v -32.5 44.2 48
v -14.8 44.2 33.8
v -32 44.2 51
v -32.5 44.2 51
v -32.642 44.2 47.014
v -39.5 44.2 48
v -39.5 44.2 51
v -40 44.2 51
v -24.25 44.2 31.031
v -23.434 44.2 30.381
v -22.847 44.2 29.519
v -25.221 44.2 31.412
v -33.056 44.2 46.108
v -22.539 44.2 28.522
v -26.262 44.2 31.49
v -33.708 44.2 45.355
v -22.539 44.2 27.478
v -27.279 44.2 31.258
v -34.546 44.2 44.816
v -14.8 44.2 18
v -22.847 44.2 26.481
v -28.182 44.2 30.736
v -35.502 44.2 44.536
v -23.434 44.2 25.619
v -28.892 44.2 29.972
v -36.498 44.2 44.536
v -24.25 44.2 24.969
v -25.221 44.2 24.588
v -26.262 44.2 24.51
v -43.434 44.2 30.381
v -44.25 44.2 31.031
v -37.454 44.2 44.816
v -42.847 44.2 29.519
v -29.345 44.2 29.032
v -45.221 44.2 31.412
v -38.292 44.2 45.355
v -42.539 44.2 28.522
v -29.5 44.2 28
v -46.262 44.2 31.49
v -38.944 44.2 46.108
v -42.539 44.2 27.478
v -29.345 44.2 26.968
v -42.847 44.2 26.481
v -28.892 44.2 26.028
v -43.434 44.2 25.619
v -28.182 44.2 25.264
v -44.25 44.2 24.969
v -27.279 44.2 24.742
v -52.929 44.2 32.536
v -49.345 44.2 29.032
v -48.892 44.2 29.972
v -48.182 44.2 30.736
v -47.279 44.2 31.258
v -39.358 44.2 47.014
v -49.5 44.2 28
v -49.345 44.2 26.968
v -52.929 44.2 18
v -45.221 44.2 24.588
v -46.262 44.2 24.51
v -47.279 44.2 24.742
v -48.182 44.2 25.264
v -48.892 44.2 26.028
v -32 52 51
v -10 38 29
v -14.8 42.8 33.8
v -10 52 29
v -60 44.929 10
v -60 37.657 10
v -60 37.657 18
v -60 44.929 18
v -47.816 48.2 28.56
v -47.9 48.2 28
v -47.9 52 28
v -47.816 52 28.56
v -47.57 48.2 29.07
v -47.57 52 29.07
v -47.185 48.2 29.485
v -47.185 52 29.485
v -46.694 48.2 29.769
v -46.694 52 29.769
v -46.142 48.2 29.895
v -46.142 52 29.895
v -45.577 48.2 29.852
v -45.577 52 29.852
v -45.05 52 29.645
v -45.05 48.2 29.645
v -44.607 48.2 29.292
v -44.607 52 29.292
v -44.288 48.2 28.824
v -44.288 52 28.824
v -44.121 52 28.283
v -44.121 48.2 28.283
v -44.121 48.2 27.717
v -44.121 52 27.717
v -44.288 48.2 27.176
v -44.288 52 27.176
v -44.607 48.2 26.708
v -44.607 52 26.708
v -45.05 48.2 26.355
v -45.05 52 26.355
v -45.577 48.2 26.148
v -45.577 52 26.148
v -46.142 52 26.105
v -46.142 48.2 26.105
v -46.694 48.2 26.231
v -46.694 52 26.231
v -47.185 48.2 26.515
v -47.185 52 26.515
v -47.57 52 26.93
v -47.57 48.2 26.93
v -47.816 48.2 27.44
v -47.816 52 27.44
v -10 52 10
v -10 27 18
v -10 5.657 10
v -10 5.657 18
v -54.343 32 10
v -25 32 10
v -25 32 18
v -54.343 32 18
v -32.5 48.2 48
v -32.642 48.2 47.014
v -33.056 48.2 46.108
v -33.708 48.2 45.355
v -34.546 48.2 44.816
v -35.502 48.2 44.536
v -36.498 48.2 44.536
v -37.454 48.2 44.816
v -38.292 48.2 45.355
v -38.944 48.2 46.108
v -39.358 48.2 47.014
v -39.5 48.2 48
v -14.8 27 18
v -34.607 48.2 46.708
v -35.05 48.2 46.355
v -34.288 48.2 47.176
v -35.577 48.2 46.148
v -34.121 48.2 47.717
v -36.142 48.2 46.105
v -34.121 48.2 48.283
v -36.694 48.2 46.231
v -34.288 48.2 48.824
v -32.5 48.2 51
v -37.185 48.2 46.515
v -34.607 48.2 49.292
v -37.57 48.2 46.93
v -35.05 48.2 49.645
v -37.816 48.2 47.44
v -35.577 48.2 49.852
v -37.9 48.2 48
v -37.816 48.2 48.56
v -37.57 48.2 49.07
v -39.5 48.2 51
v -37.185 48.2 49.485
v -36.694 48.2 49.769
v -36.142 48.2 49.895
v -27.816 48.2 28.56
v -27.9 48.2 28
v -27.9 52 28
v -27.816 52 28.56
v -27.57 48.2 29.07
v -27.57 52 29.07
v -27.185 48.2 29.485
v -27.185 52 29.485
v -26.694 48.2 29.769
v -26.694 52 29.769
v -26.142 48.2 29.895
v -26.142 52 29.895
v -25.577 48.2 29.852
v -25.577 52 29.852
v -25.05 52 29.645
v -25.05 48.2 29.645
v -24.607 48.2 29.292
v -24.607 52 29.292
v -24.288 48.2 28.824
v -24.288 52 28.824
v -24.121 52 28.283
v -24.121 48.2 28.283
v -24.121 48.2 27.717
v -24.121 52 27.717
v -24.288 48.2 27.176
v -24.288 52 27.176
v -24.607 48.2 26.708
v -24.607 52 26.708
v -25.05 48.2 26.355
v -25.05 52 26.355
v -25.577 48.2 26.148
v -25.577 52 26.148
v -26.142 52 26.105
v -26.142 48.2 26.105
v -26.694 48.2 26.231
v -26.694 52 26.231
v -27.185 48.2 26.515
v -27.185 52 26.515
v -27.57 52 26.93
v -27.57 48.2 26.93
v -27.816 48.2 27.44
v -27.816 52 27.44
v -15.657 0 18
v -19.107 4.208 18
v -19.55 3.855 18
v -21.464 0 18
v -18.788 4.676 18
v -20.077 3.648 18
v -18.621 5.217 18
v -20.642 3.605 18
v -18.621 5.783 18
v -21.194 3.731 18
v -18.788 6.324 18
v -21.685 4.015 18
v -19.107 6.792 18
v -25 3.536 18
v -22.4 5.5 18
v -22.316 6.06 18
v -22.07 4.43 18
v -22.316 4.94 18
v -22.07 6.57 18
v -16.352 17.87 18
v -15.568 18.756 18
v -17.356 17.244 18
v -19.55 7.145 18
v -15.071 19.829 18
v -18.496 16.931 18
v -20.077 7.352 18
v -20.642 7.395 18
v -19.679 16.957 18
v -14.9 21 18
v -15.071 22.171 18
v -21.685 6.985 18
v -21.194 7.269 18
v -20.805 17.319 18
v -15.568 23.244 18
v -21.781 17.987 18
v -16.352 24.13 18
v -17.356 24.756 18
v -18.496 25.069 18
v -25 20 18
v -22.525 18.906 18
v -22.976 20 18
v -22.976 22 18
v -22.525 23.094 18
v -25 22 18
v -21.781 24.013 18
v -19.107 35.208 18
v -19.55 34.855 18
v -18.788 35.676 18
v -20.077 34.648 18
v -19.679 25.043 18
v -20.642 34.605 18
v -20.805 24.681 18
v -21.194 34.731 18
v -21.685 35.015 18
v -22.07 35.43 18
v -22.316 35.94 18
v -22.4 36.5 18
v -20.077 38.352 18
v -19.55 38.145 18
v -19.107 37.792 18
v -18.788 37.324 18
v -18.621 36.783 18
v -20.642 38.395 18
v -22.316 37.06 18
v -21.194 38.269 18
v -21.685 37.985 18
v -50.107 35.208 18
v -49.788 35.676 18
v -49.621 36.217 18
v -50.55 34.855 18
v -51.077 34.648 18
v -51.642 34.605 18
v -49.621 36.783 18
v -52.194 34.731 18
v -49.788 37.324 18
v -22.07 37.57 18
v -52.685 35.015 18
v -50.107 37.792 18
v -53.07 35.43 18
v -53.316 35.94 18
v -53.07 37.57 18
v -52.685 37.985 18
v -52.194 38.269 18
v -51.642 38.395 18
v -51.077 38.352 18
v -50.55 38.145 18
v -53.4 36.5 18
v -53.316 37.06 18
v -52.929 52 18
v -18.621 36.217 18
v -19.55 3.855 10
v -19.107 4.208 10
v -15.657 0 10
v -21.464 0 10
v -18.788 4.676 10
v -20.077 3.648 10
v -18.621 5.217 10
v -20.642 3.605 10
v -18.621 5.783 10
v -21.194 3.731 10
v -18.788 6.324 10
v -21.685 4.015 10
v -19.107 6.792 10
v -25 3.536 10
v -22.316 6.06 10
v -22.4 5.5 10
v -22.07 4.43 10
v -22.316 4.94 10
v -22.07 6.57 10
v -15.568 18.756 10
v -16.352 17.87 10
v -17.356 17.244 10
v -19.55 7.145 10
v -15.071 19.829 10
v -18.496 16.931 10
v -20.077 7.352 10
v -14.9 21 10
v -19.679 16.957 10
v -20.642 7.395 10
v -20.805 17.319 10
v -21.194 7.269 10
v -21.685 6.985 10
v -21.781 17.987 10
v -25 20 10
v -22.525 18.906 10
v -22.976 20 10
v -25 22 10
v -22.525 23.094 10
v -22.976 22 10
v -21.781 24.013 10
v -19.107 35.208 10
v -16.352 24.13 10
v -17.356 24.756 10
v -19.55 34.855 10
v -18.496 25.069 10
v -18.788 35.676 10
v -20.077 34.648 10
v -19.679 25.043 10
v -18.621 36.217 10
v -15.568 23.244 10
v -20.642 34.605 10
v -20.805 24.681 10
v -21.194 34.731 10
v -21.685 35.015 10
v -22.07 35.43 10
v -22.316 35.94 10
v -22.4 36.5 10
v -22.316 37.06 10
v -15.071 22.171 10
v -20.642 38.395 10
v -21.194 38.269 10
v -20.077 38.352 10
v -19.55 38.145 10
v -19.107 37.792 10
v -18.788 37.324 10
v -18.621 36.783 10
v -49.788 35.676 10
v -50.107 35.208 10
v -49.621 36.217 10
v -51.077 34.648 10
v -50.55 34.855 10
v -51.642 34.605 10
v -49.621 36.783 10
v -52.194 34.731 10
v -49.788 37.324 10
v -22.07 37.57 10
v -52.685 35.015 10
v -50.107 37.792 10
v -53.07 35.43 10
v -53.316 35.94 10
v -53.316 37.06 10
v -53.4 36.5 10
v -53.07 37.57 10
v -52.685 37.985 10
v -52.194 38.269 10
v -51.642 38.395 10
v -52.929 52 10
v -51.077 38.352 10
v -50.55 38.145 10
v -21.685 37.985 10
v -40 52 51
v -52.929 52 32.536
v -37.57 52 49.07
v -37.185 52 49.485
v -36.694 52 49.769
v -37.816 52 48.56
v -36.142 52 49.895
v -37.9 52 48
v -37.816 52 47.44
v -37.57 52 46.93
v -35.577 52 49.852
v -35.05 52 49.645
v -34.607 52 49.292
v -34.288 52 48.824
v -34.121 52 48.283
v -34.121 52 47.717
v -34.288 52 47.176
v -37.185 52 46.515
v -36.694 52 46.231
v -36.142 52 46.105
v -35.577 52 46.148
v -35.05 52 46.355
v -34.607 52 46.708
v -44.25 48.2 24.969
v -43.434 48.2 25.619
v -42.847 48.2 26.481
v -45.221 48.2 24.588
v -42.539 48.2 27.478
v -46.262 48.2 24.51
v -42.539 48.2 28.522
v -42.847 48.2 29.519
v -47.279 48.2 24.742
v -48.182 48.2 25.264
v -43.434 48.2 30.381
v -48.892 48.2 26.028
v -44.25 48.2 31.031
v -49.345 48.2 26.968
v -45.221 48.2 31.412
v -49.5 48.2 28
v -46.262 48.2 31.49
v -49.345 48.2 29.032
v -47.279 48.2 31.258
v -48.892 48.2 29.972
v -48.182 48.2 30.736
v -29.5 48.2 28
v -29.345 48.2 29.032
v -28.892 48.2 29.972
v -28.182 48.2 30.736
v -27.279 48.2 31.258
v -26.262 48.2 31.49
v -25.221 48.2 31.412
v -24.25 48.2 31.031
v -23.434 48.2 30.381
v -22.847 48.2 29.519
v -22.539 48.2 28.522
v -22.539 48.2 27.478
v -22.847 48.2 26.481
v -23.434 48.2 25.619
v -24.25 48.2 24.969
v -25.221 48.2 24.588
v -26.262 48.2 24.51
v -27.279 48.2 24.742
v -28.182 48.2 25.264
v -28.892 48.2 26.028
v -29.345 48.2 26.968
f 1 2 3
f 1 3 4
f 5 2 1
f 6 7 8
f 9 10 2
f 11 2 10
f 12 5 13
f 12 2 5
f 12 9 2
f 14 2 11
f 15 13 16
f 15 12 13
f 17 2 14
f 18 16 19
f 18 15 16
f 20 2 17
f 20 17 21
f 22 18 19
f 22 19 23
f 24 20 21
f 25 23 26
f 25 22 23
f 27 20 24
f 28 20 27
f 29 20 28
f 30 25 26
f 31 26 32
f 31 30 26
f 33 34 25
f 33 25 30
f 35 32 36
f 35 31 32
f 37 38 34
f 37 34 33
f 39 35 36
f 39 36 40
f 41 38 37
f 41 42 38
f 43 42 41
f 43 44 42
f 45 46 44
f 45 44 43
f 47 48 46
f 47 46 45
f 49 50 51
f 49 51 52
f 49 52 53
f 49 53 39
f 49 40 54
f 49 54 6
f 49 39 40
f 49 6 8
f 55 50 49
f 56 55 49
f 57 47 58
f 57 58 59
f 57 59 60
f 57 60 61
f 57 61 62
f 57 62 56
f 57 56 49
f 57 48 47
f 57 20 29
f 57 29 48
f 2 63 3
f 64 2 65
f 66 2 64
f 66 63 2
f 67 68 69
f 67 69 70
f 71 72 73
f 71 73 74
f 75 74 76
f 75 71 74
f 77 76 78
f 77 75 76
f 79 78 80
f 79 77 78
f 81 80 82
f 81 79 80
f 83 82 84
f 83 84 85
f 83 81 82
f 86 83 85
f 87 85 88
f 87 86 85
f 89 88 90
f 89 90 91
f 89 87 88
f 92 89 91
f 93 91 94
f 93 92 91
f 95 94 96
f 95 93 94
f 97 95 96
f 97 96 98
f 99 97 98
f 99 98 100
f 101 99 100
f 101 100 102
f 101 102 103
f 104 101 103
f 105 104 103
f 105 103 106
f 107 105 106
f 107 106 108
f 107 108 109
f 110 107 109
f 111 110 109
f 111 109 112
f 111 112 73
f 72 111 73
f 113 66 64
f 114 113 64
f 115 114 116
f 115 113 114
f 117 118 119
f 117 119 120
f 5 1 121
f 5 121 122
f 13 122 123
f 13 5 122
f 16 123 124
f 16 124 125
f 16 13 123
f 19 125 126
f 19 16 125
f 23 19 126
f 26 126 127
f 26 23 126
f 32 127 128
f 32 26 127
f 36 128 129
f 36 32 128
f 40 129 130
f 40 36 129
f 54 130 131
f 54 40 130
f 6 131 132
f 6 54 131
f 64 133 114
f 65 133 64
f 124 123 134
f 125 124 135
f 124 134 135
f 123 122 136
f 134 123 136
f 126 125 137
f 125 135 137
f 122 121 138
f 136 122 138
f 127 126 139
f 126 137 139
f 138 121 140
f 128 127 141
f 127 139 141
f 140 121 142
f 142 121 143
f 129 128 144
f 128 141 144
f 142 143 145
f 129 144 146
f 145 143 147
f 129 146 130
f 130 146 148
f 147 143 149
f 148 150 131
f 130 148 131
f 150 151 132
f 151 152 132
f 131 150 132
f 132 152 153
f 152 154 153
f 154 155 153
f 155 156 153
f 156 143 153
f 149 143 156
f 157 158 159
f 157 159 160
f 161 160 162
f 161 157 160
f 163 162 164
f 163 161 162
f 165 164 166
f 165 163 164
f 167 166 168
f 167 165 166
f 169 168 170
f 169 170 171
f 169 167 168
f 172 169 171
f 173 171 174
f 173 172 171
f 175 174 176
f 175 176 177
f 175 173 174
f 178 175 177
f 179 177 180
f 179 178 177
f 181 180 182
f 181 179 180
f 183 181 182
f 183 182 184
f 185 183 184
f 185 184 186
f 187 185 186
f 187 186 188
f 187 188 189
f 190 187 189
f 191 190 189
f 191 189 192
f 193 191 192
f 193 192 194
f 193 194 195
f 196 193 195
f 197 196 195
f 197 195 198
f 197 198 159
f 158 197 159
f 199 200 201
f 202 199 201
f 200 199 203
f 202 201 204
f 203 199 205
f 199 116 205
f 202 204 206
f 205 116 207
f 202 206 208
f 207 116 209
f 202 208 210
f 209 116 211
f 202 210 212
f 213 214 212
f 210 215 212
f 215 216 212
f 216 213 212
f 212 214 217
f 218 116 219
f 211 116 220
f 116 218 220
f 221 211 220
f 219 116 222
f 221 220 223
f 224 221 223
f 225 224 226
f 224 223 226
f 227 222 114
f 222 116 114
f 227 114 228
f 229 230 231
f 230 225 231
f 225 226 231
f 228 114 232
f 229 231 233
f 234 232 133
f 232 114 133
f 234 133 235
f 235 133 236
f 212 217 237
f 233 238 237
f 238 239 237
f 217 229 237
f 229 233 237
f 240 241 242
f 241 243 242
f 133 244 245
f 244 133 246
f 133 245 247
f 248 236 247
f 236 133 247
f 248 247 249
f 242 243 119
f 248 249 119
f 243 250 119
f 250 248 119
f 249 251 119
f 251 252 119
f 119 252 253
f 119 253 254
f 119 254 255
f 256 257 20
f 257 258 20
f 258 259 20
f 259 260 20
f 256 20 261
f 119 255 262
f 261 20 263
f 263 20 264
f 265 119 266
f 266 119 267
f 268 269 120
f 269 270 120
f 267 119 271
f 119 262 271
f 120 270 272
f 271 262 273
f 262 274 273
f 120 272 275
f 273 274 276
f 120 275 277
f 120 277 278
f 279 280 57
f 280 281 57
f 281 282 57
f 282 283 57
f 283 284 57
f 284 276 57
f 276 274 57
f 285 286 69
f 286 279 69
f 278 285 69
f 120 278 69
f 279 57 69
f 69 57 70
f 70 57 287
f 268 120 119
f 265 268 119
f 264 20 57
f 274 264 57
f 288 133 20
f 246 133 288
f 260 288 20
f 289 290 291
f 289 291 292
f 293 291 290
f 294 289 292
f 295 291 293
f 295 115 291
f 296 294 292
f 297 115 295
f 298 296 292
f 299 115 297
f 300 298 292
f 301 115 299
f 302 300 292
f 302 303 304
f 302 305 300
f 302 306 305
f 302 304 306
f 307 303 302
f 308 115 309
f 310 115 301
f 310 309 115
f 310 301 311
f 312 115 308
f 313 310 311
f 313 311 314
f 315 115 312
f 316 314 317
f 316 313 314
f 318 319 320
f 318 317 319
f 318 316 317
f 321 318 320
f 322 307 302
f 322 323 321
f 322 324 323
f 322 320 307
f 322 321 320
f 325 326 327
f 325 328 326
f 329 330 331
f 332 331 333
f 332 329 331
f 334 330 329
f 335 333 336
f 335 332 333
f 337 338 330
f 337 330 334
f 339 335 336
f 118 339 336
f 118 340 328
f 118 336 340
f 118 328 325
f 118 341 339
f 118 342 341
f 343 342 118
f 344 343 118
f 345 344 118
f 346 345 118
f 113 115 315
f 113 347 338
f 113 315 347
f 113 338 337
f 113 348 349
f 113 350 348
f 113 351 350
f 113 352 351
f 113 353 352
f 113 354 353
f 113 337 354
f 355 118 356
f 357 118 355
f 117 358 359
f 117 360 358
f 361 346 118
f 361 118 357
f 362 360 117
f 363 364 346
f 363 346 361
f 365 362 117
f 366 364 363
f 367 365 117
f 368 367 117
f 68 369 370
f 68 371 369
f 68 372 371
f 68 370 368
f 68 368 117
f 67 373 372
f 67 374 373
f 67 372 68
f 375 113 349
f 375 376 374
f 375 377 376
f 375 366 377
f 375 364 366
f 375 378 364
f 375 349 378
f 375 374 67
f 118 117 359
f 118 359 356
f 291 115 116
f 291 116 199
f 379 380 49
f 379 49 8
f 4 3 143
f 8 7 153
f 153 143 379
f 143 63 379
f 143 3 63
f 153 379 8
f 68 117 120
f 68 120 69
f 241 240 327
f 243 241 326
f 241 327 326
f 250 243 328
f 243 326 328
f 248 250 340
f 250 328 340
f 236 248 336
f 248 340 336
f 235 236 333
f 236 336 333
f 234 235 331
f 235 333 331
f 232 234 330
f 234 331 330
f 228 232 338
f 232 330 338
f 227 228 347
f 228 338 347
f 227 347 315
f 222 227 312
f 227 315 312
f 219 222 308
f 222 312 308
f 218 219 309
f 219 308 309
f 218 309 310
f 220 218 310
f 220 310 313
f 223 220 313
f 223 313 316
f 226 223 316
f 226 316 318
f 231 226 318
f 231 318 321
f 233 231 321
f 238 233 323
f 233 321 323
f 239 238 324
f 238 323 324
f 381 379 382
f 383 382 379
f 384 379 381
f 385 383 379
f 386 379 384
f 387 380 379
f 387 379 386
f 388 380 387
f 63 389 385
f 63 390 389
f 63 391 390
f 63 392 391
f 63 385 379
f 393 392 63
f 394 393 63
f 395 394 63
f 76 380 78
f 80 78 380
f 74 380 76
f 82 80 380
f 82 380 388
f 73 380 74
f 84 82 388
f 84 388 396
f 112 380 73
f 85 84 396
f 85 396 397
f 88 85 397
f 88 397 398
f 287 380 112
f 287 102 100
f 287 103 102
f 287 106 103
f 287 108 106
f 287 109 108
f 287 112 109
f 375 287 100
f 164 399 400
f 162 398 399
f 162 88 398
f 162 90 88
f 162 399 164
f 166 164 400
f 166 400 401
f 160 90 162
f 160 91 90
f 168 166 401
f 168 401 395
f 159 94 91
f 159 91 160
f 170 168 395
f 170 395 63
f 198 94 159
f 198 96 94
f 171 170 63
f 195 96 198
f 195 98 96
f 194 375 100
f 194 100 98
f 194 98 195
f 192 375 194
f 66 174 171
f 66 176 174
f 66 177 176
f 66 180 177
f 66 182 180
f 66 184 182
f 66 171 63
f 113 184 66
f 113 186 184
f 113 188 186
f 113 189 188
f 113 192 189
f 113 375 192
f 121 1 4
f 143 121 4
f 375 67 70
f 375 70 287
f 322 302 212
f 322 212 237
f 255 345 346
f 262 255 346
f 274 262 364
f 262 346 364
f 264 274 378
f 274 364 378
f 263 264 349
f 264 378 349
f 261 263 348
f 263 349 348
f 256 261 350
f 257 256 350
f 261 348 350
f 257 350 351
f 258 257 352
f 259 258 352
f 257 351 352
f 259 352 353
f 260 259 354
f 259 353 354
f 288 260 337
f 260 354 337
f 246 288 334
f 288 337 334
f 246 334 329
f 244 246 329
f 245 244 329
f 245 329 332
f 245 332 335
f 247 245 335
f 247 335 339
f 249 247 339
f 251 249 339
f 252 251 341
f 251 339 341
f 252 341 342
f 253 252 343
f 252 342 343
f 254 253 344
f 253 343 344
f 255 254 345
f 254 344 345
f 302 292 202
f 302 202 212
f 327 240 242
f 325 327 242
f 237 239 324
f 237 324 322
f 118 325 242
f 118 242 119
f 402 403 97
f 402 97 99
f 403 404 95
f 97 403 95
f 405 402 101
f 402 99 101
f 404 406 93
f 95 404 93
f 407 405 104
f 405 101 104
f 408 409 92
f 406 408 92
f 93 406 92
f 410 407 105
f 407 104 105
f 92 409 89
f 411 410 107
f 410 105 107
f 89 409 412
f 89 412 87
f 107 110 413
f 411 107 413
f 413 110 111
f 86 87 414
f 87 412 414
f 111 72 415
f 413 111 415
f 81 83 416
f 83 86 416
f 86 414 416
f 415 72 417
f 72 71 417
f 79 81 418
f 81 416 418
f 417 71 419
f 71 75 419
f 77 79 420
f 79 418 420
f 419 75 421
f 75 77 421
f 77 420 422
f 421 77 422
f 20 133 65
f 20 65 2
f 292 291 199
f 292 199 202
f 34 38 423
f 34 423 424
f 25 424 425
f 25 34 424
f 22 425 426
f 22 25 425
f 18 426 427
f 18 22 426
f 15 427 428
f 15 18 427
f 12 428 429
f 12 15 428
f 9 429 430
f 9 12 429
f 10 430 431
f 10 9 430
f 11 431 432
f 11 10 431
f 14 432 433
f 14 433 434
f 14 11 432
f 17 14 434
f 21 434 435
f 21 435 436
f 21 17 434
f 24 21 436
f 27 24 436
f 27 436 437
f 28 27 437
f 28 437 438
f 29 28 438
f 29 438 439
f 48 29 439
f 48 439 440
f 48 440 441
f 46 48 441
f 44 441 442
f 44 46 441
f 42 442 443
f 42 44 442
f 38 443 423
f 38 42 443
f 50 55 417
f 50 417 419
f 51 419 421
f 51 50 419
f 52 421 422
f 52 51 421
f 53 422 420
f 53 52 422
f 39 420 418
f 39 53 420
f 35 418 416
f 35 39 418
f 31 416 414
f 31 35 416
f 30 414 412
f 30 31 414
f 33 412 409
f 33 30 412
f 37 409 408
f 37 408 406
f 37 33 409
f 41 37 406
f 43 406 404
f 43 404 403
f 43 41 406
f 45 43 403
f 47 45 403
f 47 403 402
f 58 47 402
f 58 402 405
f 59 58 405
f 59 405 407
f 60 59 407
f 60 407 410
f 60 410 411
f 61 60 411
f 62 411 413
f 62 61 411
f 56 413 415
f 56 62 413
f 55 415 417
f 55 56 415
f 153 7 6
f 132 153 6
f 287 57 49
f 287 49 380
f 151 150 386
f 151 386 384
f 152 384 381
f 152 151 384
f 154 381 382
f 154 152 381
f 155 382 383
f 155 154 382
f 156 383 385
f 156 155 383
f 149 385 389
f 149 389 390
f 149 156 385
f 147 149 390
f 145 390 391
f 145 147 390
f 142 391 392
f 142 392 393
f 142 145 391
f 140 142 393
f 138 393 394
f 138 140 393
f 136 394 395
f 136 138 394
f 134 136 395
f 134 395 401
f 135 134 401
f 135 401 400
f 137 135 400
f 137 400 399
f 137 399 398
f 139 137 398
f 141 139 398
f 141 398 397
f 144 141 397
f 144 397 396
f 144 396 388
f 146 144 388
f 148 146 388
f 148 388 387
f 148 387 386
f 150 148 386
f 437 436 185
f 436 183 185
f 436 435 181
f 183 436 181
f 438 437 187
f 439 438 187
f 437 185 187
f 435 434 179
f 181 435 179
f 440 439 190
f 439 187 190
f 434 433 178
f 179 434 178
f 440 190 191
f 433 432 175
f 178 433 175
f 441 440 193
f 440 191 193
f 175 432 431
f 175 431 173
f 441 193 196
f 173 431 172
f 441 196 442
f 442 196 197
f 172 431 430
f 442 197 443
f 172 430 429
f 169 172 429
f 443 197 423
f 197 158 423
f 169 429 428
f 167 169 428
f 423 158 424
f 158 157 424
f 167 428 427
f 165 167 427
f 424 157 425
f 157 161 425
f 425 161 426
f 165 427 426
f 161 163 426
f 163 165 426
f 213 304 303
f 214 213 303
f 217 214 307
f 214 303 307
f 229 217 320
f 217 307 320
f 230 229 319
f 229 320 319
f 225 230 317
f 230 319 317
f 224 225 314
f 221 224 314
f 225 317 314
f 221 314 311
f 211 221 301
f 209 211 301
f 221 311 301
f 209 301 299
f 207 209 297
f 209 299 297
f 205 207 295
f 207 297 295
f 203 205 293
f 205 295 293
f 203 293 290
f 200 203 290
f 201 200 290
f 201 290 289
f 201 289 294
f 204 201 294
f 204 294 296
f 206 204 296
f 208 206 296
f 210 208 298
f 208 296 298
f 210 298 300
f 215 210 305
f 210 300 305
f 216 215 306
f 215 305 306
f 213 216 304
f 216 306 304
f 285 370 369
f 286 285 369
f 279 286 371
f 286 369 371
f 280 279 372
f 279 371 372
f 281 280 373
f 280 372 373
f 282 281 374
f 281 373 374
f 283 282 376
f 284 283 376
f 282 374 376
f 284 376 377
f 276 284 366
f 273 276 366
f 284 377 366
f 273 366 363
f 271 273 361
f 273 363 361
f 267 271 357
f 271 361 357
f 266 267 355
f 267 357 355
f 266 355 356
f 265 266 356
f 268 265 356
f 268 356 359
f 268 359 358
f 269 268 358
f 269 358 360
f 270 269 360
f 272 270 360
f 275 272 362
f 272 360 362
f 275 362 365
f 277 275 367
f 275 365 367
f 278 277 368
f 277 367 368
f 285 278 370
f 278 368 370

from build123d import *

# Parameters (mm, degrees)
SKETCH_R        = 1.9
SKETCH_R_2      = 4.1
PAD_DEPTH       = 8
PAD001_DEPTH    = 33
SKETCH002_R     = 1.9
POCKET_DEPTH    = 7.801
POCKET001_DEPTH = 5
POCKET002_DEPTH = 52.001
SKETCH006_R     = 3.5
POCKET003_DEPTH = 4
SKETCH007_W     = 2.023821
SKETCH007_H     = 2
POCKET004_DEPTH = 8.001


with BuildPart() as pocket004:
    # Sketch → Pad (new body)
    with BuildSketch(Plane.XY.offset(10)):
        Polygon((0, 52), (0, 5.656854), (5.656854, 0), (11.464466, 0), (15, 3.535534), (15, 32), (44.343146, 32), (50, 37.656854), (50, 44.928932), (42.928932, 52), align=None)
        with Locations((41.5, 36.5)):
            Circle(SKETCH_R, mode=Mode.SUBTRACT)
        with Locations((10.5, 36.5)):
            Circle(SKETCH_R, mode=Mode.SUBTRACT)
        with Locations((10.5, 5.5)):
            Circle(SKETCH_R, mode=Mode.SUBTRACT)
        with Locations((9, 21)):
            Circle(SKETCH_R_2, mode=Mode.SUBTRACT)
    extrude(amount=PAD_DEPTH)

    # Sketch001 → Pad001 (new body)
    with BuildSketch(Plane.XY.offset(18)):
        Polygon((42.928932, 52), (0, 52), (0, 27), (4.8, 27), (4.8, 44.2), (42.928932, 44.2), align=None)
    extrude(amount=PAD001_DEPTH)

    # Sketch002 → Pocket (cut, through all)
    with BuildSketch(Plane(origin=(0, 44.2, 10), x_dir=(1, 0, 0), z_dir=(0, -1, 0))):
        with Locations((26, 38)):
            Circle(SKETCH002_R)
        with Locations((16, 18)):
            Circle(SKETCH002_R)
        with Locations((36, 18)):
            Circle(SKETCH002_R)
    extrude(amount=-POCKET_DEPTH, mode=Mode.SUBTRACT)

    # Sketch003 → Pocket001 (cut)
    with BuildSketch(Plane(origin=(4.8, 0, 10), x_dir=(0, 1, 0), z_dir=(1, 0, 0))):
        Polygon((27, 8), (44.2, 25.2), (44.2, 41), (27, 41), align=None)
    extrude(amount=-POCKET001_DEPTH, mode=Mode.SUBTRACT)

    # Sketch005 → Pocket002 (cut, through all)
    with BuildSketch(Plane(origin=(0, 52, 10), x_dir=(-1, 0, 0), z_dir=(0, 1, 0))):
        Polygon((-42.928932, 22.535571), (-30, 41), (-42.928932, 41), align=None)
        Polygon((-22, 41), (0, 19), (0, 41), align=None)
    extrude(amount=-POCKET002_DEPTH, mode=Mode.SUBTRACT)

    # Sketch006 → Pocket003 (cut)
    with BuildSketch(Plane(origin=(0, 44.2, 10), x_dir=(1, 0, 0), z_dir=(0, -1, 0))):
        with Locations((16, 18)):
            Circle(SKETCH006_R)
        with Locations((36, 18)):
            Circle(SKETCH006_R)
        with BuildLine():
            ThreePointArc((22.5, 38), (26, 34.5), (29.5, 38))
            Line((29.5, 41), (29.5, 38))
            Line((22.5, 41), (29.5, 41))
            Line((22.5, 38), (22.5, 41))
        make_face()
    extrude(amount=-POCKET003_DEPTH, mode=Mode.SUBTRACT)

    # Sketch007 → Pocket004 (cut, through all)
    with BuildSketch(Plane.XY.offset(18)):
        with Locations((13.98809, 21)):
            Rectangle(SKETCH007_W, SKETCH007_H)
    extrude(amount=-POCKET004_DEPTH, mode=Mode.SUBTRACT)


with BuildPart() as part_mirroring:
    # Part__Mirroring: instance of Pocket004
    add(pocket004.part.mirror(Plane(origin=(0, 26, 30.500002), x_dir=(0, -1, 0), z_dir=(1, 0, 0))))


with BuildPart() as part_mirroring_1:
    # Part__Mirroring placement: moved
    add(part_mirroring.part.moved(Location((-10, 0, 0))))


solid = part_mirroring_1.part
